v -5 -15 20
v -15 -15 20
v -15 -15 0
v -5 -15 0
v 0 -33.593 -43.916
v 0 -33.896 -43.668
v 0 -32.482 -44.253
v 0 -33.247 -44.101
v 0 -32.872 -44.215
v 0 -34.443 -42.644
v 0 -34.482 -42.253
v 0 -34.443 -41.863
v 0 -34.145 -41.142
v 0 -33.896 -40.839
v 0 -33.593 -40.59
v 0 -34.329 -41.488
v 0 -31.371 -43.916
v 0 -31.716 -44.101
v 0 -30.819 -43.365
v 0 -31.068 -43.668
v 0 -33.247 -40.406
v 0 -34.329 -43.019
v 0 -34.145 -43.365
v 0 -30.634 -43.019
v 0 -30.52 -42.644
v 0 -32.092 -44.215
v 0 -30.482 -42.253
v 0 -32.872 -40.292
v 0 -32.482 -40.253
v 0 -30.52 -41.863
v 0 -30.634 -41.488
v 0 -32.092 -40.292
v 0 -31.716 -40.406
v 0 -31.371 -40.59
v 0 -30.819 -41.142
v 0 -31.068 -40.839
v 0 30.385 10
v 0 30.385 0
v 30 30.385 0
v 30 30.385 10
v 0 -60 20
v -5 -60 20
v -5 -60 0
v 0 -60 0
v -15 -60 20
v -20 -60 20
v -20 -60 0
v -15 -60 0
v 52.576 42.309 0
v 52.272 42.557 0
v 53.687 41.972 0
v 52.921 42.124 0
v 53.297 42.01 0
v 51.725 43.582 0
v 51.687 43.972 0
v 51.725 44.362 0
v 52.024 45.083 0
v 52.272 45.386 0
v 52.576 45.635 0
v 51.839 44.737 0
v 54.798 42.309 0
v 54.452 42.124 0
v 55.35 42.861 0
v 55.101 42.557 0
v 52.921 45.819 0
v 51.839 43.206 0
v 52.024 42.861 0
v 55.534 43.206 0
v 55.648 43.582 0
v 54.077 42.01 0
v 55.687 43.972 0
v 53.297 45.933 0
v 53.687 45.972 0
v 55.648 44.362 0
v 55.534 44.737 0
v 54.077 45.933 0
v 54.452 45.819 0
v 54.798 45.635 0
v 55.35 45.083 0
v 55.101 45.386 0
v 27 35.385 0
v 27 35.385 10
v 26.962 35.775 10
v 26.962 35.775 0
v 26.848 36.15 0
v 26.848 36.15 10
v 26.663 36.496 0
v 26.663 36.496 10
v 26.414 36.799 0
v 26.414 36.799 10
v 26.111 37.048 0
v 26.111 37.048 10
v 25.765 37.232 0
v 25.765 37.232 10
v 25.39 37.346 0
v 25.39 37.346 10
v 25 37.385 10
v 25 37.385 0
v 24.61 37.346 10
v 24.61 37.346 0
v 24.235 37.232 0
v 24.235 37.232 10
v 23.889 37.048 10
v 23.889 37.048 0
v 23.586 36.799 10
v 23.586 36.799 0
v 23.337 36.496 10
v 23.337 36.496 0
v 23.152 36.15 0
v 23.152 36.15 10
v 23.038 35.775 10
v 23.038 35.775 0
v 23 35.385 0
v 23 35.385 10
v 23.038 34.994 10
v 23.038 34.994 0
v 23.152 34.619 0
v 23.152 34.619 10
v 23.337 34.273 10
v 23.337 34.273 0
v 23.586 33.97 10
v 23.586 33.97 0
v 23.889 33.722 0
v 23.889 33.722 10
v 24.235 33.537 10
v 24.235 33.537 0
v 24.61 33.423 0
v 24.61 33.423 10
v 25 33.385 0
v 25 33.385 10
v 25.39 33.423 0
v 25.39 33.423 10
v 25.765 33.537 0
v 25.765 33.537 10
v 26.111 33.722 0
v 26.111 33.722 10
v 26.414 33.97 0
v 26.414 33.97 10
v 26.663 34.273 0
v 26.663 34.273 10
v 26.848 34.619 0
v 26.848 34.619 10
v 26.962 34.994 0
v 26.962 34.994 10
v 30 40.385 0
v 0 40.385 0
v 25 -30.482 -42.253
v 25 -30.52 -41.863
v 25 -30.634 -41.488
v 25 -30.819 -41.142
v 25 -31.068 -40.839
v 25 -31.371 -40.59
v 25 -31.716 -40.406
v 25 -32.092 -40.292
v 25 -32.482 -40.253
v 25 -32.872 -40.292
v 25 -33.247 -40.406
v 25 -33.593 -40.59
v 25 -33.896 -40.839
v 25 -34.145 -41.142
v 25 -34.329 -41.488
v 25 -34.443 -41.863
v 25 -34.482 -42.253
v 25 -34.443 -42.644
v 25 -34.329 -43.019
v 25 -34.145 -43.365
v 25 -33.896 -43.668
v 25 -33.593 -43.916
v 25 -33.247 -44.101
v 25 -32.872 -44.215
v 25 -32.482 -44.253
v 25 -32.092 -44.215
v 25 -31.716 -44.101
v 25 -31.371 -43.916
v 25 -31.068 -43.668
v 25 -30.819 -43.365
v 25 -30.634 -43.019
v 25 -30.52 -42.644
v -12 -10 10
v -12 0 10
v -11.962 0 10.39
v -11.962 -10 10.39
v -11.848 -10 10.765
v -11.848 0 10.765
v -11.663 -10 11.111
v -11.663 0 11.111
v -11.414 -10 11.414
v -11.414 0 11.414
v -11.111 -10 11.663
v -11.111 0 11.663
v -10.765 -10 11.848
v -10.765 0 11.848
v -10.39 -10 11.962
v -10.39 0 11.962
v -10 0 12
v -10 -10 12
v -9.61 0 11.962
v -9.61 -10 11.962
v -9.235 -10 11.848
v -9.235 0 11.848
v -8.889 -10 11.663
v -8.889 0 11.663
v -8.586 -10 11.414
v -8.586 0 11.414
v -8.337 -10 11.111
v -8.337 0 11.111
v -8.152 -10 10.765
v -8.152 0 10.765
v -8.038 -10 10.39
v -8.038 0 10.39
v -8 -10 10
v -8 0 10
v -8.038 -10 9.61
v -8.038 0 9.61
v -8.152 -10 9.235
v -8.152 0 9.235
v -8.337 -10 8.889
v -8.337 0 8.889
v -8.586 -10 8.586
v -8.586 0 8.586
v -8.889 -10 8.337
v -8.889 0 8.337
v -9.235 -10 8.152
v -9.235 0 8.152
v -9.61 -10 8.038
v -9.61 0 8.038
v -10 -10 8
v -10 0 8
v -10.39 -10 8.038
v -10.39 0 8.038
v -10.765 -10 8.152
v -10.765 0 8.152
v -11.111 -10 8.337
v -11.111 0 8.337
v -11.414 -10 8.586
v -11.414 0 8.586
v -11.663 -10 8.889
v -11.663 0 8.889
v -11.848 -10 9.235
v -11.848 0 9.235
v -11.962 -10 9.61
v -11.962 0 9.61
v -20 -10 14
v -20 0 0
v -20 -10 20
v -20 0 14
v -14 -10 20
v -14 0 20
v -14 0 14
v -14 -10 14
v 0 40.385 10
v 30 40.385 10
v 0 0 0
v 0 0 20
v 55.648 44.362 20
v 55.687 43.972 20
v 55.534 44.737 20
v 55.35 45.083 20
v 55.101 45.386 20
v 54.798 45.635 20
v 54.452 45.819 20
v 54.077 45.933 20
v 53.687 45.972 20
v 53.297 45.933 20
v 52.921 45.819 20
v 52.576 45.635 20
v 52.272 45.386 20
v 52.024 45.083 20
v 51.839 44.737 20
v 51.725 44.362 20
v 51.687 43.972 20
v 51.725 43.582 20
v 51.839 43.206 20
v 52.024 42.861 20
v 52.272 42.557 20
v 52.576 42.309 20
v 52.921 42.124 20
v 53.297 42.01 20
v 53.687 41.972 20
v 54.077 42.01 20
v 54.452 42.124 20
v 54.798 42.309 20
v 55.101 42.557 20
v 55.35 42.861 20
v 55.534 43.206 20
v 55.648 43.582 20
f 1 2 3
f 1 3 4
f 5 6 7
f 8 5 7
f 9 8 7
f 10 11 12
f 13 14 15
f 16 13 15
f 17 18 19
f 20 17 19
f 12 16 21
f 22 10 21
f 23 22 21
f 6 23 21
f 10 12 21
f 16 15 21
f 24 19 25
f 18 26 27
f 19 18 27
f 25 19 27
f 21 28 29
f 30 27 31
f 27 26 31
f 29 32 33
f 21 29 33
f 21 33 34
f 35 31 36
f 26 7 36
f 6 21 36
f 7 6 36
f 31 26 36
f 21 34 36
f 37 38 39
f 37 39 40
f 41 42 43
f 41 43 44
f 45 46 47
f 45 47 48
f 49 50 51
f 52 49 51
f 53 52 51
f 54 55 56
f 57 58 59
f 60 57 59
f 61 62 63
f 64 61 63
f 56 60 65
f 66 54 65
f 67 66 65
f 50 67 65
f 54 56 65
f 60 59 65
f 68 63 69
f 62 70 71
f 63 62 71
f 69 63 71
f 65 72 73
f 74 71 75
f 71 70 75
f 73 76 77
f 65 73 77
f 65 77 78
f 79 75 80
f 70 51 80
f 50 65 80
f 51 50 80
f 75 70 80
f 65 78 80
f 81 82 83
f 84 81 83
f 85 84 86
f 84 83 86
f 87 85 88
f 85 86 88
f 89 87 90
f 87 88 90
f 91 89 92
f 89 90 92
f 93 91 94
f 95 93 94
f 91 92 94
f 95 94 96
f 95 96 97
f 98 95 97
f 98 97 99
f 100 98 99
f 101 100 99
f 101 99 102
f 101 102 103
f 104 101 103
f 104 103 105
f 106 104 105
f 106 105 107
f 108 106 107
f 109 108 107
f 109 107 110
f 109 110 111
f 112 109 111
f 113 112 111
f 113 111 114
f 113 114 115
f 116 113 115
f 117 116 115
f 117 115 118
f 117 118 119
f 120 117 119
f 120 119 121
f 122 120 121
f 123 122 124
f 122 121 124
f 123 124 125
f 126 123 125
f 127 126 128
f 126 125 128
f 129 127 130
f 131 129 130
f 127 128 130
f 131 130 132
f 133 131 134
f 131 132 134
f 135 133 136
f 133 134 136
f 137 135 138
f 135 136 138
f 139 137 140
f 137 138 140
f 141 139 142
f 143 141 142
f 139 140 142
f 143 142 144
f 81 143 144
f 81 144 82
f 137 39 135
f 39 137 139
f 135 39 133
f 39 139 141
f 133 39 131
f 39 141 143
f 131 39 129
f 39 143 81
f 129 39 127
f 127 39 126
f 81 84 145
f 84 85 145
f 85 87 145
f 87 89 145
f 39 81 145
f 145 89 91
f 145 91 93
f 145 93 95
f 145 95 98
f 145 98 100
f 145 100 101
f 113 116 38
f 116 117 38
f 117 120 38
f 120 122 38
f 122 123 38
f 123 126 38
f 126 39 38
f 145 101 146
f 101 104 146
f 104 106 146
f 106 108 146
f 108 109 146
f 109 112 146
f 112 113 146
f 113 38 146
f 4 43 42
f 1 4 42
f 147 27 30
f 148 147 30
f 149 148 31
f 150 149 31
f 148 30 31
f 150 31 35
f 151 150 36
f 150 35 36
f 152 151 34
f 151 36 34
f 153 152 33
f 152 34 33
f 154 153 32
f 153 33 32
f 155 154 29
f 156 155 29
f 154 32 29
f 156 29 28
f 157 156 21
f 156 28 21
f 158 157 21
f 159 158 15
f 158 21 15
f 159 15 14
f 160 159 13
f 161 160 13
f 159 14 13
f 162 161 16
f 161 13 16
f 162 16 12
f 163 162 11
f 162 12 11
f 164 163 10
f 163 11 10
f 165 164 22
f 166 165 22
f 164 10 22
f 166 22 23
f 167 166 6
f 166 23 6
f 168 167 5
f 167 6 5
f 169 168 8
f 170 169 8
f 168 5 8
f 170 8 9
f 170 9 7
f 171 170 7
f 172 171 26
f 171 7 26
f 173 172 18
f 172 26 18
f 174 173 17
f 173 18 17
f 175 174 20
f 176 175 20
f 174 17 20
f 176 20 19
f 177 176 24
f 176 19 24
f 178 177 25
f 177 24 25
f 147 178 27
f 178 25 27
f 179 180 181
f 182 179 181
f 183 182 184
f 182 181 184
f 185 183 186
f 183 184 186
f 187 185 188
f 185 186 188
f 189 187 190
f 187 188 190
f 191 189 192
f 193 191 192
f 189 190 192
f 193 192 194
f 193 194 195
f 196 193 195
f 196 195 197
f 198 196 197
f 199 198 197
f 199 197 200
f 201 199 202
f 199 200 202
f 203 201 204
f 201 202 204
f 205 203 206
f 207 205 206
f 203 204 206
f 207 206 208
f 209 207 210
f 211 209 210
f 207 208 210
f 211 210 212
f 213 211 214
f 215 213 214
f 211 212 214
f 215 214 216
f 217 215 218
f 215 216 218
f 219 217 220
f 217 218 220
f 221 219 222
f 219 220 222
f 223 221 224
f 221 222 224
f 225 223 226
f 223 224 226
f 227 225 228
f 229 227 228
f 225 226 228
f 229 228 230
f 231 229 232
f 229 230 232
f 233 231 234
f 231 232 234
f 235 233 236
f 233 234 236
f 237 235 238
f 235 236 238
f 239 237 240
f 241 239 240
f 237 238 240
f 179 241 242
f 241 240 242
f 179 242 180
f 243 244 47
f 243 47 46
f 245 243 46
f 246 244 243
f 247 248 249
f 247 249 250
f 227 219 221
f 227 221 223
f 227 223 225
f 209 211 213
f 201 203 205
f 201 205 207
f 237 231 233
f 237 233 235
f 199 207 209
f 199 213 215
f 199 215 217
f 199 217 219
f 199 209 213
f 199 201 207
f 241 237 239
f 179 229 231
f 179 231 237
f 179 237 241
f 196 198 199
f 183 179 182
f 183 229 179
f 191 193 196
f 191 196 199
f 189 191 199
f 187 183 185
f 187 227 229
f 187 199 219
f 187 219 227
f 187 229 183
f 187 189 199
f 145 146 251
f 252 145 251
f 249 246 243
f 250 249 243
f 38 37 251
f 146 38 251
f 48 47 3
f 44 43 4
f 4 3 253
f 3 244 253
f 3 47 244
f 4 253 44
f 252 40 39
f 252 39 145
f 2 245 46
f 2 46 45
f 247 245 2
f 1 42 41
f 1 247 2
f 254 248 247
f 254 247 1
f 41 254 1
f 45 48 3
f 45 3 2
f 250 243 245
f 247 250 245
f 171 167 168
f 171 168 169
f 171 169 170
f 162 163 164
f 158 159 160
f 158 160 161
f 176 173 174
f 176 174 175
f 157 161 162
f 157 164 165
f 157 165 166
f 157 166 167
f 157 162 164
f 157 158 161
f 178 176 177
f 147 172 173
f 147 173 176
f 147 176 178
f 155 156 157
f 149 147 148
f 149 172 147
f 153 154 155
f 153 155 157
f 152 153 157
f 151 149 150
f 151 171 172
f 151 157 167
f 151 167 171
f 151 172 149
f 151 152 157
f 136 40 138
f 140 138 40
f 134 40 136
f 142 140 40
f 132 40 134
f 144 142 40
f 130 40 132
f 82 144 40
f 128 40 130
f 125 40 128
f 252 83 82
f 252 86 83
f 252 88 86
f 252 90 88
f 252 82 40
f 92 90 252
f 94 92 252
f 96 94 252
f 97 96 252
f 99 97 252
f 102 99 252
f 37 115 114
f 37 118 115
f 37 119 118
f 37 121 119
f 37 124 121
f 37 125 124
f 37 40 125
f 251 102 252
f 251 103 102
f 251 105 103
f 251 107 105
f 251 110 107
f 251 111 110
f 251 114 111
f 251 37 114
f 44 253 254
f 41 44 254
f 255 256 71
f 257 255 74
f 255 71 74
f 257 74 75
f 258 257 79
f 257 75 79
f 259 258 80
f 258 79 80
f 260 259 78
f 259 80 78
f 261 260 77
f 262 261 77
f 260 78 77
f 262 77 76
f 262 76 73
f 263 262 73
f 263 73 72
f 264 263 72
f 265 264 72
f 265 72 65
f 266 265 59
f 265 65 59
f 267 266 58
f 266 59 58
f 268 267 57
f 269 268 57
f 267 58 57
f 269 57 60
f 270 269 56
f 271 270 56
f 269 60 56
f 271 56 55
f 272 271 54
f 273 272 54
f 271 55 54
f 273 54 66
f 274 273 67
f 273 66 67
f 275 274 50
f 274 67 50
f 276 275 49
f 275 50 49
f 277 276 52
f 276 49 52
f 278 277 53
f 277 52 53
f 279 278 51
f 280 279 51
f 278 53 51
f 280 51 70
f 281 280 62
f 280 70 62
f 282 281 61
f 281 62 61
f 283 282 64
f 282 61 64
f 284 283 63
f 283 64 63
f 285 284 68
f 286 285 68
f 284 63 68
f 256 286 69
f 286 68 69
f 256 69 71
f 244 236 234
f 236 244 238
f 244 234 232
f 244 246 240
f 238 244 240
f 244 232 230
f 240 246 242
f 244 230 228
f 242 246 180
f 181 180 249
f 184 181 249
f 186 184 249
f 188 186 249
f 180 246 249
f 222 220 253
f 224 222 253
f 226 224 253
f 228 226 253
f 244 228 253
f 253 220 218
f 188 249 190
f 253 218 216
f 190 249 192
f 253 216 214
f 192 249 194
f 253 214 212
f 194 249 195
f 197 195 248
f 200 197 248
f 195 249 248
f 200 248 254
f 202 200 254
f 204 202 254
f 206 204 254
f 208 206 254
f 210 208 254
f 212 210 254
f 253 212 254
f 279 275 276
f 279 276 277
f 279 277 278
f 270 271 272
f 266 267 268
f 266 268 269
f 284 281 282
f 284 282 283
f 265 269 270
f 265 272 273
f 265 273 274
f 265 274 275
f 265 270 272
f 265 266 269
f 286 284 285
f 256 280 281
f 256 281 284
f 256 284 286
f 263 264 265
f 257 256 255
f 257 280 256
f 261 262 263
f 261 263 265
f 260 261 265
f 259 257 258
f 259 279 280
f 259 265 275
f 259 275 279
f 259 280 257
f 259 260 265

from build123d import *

# Parameters (mm, degrees)
F0_W      = 20
F0_H      = 20
F1_DEPTH  = 60
F2_W      = 10
F2_H      = 20
F3_DEPTH  = 45
F4_W      = 10
F4_H      = 10
F5_DEPTH  = 30
F6_R      = 2
F7_DEPTH  = 10.001
F8_R      = 2
F9_DEPTH  = 25
F10_R     = 2
F11_DEPTH = 10
F12_W     = 10
F12_H     = 6
F13_DEPTH = 6
F14_R     = 2
F15_DEPTH = 20


with BuildPart() as f1:
    # F0 (on Front) → F1 (new body)
    with BuildSketch(Plane.XZ):
        with Locations((-10, 10)):
            Rectangle(F0_W, F0_H)
    extrude(amount=F1_DEPTH)

    # F2 (on face) → F3 (cut)
    with BuildSketch(Plane.XZ.offset(60)):
        with Locations((-10, 10)):
            Rectangle(F2_W, F2_H)
    extrude(amount=-F3_DEPTH, mode=Mode.SUBTRACT)

    # F10 (on face) → F11 (cut)
    with BuildSketch(Plane(origin=(0, 0, 0), x_dir=(-1, 0, 0), z_dir=(0, 1, 0))):
        with Locations((10, 10)):
            Circle(F10_R)
    extrude(amount=-F11_DEPTH, mode=Mode.SUBTRACT)

    # F12 (on face) → F13 (cut)
    with BuildSketch(Plane(origin=(-20, 0, 0), x_dir=(0, -1, 0), z_dir=(-1, 0, 0))):
        with Locations((5, 17)):
            Rectangle(F12_W, F12_H)
    extrude(amount=-F13_DEPTH, mode=Mode.SUBTRACT)


with BuildPart() as f5:
    # F4 (on Right) → F5 (new body)
    with BuildSketch(Plane.YZ):
        with Locations((35.384615, 5)):
            Rectangle(F4_W, F4_H)
    extrude(amount=F5_DEPTH)

    # F6 (on face) → F7 (cut, through all)
    with BuildSketch(Plane.XY.offset(10)):
        with Locations((25, 35.384615)):
            Circle(F6_R)
    extrude(amount=-F7_DEPTH, mode=Mode.SUBTRACT)


with BuildPart() as f9:
    # F8 (on Right) → F9 (new body)
    with BuildSketch(Plane.YZ):
        with Locations((-32.481715, -42.253371)):
            Circle(F8_R)
    extrude(amount=F9_DEPTH)


with BuildPart() as f15:
    # F14 (on Top) → F15 (new body)
    with BuildSketch(Plane.XY):
        with Locations((53.686704, 43.971695)):
            Circle(F14_R)
    extrude(amount=F15_DEPTH)


solid = Compound([f1.part, f5.part, f9.part, f15.part])
